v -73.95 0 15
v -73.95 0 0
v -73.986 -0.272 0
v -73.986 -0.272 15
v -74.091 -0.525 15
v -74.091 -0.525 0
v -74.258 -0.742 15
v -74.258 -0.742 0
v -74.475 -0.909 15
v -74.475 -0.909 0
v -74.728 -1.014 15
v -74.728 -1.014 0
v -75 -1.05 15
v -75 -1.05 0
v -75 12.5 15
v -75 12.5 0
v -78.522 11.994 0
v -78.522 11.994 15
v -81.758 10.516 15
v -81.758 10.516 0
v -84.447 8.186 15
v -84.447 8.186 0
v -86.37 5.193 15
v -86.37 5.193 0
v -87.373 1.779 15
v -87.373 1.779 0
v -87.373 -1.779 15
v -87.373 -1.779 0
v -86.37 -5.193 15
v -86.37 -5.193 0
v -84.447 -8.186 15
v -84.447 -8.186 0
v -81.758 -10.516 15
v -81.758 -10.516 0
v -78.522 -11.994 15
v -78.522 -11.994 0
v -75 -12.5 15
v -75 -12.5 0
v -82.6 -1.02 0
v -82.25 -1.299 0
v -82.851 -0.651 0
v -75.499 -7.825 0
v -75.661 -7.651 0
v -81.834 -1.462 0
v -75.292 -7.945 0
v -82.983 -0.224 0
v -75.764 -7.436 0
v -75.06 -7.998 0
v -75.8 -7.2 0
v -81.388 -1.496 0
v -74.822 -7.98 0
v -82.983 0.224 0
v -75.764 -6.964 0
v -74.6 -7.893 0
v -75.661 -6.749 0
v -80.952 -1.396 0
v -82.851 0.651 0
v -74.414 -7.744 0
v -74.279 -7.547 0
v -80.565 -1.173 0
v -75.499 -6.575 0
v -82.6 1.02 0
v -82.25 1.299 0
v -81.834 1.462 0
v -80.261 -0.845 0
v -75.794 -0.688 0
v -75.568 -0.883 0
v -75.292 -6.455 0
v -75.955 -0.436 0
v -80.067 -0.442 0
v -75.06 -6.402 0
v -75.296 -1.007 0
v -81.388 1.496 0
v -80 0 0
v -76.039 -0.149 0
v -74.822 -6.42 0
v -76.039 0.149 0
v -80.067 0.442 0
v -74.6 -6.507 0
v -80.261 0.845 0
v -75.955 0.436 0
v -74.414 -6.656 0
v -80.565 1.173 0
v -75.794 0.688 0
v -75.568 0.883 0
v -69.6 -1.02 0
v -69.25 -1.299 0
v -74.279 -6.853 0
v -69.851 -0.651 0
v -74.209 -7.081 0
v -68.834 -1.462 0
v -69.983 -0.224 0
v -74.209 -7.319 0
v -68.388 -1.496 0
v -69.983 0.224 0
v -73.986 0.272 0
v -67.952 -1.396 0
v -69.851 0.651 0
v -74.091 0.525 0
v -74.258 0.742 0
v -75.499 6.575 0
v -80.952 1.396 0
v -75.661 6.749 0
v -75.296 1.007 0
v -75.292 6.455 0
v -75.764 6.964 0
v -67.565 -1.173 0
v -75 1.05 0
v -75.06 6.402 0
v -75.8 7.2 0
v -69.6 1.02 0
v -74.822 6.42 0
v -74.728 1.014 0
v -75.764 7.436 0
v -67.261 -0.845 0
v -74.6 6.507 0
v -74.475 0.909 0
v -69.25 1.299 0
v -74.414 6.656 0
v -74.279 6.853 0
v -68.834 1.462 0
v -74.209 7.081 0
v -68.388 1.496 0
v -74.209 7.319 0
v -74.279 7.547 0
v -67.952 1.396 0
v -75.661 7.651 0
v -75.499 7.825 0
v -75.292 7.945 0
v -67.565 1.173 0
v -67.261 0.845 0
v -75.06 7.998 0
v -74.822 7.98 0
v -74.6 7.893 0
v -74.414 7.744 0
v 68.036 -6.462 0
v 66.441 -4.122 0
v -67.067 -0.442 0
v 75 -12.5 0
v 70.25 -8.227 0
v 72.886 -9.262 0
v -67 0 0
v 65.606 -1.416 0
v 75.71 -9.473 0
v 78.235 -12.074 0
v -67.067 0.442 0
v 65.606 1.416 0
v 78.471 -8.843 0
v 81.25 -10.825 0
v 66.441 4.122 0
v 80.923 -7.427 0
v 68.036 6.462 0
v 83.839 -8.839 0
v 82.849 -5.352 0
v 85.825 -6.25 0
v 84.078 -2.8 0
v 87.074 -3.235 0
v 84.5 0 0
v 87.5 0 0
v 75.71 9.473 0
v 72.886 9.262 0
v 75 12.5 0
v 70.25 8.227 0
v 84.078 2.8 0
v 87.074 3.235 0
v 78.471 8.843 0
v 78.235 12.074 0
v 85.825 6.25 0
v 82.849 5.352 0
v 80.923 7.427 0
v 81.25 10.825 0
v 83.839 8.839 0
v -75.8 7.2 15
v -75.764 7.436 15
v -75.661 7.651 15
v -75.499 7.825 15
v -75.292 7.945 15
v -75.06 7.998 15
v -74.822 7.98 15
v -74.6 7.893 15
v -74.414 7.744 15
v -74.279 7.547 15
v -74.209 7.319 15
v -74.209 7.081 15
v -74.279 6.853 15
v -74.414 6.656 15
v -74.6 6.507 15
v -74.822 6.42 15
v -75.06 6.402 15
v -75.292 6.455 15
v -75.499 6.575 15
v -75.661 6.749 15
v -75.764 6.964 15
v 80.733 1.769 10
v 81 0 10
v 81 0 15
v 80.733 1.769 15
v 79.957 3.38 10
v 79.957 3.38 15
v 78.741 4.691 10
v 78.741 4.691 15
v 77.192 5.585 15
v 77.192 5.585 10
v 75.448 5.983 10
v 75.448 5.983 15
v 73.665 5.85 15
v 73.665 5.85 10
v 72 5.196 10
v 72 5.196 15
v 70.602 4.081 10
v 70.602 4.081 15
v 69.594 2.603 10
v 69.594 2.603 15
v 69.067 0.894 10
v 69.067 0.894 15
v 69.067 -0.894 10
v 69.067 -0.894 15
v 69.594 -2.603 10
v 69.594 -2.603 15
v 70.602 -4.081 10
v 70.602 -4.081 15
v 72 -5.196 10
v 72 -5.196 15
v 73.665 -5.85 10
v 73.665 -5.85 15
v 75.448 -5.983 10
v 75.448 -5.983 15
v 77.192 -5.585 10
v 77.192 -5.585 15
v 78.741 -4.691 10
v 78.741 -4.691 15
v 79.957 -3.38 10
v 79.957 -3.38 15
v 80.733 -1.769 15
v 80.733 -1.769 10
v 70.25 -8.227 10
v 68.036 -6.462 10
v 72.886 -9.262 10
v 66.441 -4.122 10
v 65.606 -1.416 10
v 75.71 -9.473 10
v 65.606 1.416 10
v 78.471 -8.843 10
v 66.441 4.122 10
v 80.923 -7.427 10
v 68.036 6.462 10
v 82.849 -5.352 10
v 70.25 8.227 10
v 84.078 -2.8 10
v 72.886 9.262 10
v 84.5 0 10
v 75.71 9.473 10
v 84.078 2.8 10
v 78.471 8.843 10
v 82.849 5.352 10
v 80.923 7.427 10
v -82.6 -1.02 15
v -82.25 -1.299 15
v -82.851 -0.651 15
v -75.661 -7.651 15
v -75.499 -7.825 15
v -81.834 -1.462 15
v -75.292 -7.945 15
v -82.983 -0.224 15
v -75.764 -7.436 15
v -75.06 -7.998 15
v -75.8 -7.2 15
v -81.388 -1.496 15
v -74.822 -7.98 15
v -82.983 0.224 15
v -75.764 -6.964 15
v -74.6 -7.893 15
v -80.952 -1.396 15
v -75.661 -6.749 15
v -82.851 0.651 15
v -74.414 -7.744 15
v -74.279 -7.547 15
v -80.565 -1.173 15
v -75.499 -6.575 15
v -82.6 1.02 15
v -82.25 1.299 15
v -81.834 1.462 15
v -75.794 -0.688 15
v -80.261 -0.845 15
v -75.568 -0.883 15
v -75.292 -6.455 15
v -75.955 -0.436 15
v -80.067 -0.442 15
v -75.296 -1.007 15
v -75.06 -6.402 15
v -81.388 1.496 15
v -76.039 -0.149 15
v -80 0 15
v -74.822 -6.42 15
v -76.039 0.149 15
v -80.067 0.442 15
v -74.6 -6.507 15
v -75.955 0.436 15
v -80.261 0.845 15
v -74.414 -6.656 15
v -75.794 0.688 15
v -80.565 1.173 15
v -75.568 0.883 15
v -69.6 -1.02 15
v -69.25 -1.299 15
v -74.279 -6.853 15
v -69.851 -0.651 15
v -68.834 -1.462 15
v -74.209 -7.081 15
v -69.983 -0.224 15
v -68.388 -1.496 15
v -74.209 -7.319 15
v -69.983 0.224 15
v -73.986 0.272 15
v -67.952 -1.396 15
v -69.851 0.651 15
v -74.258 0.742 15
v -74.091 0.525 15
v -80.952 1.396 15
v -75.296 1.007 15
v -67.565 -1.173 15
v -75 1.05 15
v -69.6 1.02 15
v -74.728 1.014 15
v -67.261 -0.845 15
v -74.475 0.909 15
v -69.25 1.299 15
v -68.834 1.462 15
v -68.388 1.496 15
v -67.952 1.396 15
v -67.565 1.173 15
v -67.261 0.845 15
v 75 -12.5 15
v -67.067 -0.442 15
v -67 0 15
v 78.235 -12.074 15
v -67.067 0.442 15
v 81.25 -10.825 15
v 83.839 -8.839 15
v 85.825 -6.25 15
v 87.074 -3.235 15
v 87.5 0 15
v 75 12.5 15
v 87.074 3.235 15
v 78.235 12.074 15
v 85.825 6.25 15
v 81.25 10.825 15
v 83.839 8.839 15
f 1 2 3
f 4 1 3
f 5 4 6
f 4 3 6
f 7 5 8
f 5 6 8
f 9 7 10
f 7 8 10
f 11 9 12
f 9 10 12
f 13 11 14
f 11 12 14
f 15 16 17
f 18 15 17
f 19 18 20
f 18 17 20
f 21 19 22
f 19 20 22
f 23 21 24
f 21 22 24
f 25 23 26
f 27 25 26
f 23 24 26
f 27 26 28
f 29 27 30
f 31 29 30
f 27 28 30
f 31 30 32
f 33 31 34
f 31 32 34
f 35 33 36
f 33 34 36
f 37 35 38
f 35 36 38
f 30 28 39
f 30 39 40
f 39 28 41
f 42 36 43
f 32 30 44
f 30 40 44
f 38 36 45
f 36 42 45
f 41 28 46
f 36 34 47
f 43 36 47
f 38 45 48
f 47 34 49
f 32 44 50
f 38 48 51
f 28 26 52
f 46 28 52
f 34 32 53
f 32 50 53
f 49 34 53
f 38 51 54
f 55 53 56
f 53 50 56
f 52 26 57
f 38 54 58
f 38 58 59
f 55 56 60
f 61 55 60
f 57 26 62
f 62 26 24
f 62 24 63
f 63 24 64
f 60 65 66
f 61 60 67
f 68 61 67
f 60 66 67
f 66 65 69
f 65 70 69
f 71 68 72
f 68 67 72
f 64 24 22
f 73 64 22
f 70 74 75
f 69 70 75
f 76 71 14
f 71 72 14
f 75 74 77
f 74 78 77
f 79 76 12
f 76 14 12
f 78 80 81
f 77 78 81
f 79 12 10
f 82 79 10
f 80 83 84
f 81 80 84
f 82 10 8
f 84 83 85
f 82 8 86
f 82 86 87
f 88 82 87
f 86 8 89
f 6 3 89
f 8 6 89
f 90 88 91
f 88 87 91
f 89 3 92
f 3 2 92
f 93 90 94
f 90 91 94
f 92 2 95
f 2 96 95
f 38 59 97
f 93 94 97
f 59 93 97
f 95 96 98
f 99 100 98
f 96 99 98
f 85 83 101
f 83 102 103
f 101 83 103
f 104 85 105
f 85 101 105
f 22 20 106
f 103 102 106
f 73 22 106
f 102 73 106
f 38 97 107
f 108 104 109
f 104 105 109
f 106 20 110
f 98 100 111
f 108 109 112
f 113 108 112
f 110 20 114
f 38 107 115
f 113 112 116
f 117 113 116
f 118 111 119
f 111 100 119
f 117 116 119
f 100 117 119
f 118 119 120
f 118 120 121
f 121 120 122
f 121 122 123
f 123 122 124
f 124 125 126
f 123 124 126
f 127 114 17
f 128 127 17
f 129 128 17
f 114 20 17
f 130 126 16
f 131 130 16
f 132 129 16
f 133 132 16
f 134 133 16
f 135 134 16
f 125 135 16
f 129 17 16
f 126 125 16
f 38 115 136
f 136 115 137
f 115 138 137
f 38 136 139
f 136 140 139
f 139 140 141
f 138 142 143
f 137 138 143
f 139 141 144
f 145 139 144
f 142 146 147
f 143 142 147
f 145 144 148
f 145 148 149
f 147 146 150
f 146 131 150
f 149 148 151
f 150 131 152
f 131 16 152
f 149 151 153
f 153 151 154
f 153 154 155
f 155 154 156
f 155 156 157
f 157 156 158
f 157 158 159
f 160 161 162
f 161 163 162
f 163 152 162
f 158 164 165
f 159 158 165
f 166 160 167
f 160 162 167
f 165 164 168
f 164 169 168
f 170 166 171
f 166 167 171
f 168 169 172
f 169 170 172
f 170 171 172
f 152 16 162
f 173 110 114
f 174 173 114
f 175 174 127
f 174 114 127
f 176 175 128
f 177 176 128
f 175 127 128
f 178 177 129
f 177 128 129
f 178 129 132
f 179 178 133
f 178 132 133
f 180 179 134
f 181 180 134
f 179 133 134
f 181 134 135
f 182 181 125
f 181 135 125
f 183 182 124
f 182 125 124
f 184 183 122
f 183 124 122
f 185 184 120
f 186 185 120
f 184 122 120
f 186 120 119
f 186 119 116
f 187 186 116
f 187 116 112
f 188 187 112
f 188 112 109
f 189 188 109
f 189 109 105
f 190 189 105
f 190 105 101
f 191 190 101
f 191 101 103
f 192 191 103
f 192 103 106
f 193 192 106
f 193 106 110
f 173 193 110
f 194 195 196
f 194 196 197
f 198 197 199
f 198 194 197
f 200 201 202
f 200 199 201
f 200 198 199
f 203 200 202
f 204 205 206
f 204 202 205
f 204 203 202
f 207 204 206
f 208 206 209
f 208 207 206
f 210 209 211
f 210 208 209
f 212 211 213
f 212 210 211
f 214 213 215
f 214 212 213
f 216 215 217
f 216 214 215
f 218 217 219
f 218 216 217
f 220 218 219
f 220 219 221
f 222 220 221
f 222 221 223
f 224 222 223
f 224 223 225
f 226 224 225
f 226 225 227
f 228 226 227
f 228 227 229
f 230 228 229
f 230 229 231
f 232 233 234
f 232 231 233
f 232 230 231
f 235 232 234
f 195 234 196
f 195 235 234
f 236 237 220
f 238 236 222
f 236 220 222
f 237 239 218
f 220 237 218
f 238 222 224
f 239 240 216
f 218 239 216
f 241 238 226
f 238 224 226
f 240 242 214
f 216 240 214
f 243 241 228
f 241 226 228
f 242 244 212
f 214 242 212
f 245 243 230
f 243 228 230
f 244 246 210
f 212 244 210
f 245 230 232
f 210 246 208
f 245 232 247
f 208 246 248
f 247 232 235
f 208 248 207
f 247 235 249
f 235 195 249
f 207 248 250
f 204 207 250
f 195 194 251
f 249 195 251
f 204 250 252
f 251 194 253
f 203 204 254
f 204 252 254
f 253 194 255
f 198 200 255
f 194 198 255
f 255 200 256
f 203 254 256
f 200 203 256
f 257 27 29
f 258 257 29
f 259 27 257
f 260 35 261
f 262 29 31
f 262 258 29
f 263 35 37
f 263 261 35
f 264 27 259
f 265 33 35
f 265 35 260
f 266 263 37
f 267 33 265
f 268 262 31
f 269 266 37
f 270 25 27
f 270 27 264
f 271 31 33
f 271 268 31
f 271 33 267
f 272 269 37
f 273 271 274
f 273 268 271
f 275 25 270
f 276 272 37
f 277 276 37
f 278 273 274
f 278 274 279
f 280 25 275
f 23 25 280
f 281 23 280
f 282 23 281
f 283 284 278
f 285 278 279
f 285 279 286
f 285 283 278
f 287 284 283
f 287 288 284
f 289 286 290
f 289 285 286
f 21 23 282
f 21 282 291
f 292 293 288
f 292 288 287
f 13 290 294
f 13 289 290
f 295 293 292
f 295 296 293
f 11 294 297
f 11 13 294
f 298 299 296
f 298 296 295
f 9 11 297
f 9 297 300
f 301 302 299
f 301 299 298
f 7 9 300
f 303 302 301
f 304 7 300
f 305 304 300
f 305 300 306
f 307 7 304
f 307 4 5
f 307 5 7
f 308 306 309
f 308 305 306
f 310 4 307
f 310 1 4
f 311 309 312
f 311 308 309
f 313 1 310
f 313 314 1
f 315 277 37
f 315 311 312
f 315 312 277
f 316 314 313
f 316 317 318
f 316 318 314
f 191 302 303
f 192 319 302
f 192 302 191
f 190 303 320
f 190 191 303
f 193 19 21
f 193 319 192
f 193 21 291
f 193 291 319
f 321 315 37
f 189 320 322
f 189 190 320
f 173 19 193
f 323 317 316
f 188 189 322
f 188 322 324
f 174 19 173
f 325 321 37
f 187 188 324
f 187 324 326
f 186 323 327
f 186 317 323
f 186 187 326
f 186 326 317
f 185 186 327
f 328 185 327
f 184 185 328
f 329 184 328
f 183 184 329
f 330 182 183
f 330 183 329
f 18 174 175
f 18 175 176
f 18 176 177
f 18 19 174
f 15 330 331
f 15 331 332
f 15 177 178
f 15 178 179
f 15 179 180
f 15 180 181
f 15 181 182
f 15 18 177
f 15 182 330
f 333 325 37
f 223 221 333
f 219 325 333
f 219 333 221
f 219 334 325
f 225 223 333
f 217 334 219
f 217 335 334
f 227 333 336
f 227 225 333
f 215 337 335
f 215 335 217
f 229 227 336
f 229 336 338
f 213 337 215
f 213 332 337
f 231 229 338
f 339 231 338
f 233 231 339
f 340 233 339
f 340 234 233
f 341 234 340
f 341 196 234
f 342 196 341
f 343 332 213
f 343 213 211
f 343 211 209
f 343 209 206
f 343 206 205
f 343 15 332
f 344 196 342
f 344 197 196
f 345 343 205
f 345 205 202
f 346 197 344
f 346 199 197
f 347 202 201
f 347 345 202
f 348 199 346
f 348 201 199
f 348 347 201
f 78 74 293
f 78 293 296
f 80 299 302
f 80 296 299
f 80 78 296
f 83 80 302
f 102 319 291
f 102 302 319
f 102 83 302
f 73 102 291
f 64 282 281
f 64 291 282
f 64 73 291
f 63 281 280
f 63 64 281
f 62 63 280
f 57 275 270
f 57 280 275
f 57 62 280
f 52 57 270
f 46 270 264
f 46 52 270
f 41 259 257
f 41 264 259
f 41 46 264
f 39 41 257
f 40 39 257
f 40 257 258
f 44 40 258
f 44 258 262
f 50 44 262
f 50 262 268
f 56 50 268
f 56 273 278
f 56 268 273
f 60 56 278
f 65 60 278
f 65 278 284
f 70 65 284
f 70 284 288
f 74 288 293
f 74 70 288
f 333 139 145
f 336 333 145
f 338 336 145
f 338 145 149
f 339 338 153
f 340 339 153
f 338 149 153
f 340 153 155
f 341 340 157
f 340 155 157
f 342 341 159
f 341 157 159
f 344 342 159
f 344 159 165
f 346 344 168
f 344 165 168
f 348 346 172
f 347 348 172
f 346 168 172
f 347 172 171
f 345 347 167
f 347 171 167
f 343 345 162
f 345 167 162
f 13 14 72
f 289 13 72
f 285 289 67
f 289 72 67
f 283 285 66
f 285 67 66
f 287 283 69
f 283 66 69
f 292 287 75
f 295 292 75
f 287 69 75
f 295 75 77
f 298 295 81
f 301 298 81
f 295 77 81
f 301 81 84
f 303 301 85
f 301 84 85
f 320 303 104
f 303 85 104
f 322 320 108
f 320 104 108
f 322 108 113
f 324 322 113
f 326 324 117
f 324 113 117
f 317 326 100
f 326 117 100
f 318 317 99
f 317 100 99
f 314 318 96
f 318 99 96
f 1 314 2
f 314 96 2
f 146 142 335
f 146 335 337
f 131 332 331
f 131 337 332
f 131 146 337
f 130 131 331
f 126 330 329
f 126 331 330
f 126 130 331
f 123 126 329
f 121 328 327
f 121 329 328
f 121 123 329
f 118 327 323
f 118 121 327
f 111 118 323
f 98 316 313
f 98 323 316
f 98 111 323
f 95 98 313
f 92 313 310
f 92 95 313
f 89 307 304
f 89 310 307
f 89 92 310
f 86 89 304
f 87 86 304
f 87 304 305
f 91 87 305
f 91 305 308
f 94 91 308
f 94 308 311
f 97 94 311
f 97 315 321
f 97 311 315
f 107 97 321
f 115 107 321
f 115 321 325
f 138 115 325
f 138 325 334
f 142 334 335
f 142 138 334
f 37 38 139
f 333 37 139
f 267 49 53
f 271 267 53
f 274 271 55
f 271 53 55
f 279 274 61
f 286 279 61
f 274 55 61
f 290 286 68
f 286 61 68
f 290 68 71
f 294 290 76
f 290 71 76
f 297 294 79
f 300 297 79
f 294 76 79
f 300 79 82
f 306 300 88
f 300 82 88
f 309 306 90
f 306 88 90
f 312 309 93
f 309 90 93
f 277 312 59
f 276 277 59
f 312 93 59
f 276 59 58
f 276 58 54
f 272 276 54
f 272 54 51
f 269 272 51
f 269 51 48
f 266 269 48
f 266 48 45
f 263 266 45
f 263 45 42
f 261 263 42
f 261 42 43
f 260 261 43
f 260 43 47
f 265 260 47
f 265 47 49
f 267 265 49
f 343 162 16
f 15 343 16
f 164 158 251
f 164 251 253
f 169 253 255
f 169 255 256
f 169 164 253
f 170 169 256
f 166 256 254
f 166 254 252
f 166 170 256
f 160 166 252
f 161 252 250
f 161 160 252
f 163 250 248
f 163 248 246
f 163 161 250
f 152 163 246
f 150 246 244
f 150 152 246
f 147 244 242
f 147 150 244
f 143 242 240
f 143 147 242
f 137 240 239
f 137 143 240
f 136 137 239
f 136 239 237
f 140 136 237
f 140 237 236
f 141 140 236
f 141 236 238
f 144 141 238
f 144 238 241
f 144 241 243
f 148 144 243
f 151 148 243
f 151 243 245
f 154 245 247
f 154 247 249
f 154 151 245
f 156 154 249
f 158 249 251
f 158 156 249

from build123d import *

# Parameters (mm, degrees)
EXTRUDE_1_DEPTH          = 15
CUT_EXTRUDE_3_DEPTH      = 90.652105385
CUT_EXTRUDE_3_DEPTH_BACK = 90.652105385
SKETCH_7_R               = 1.5
SKETCH_8_R               = 9.5
CUT_EXTRUDE_4_DEPTH      = 10
SKETCH_9_R               = 6
CUT_EXTRUDE_10_DEPTH     = 20
M2X0_4_1_D               = 1.6
M2X0_4_2_D               = 1.6


with BuildPart() as part:
    # ｽｹｯﾁ2 → ﾎﾞｽ - 押し出し1 (new body)
    with BuildSketch(Plane.XY):
        with BuildLine():
            ThreePointArc((-62.5, 0), (-66.161165235, 8.838834765), (-75, 12.5))
            Line((-75, 12.5), (-75, 1.05))
            ThreePointArc((-75, 1.05), (-74.25753788, 0.74246212), (-73.95, 0))
            ThreePointArc((-73.95, 0), (-74.25753788, -0.74246212), (-75, -1.05))
            Line((-75, -1.05), (-75, -12.5))
            ThreePointArc((-75, -12.5), (-66.161165235, -8.838834765), (-62.5, 0))
        make_face()
        with BuildLine():
            Line((-75, 1.05), (-75, 12.5))
            ThreePointArc((-75, 12.5), (-87.5, 0), (-75, -12.5))
            Line((-75, -12.5), (-75, -1.05))
            ThreePointArc((-75, -1.05), (-76.05, 0), (-75, 1.05))
        make_face()
        with BuildLine():
            Line((75, 12.5), (-75, 12.5))
            ThreePointArc((-75, 12.5), (-66.161165235, 8.838834765), (-62.5, 0))
            ThreePointArc((-62.5, 0), (-66.161165235, -8.838834765), (-75, -12.5))
            Line((-75, -12.5), (75, -12.5))
            ThreePointArc((75, -12.5), (62.5, 0), (75, 12.5))
        make_face()
        with BuildLine():
            ThreePointArc((87.5, 0), (83.838834765, 8.838834765), (75, 12.5))
            Line((75, 12.5), (75, 1.05))
            ThreePointArc((75, 1.05), (75.74246212, 0.74246212), (76.05, 0))
            ThreePointArc((76.05, 0), (75.74246212, -0.74246212), (75, -1.05))
            Line((75, -1.05), (75, -12.5))
            ThreePointArc((75, -12.5), (83.838834765, -8.838834765), (87.5, 0))
        make_face()
        with BuildLine():
            Line((75, 1.05), (75, 12.5))
            ThreePointArc((75, 12.5), (62.5, 0), (75, -12.5))
            Line((75, -12.5), (75, -1.05))
            ThreePointArc((75, -1.05), (73.95, 0), (75, 1.05))
        make_face()
    extrude(amount=EXTRUDE_1_DEPTH)

    # ｽｹｯﾁ7 → ｶｯﾄ - 押し出し3 (cut, two sides: drawn at the far end of the back side and taken through both)
    with BuildSketch(Plane.XY.offset(-CUT_EXTRUDE_3_DEPTH_BACK)):
        with Locations((-68.5, 0)):
            Circle(SKETCH_7_R)
        with Locations((-81.5, 0)):
            Circle(SKETCH_7_R)
    extrude(amount=CUT_EXTRUDE_3_DEPTH + CUT_EXTRUDE_3_DEPTH_BACK, mode=Mode.SUBTRACT)

    # ｽｹｯﾁ8 → ｶｯﾄ - 押し出し4 (cut)
    with BuildSketch(Plane.XY):
        with Locations((75, 0)):
            Circle(SKETCH_8_R)
    extrude(amount=CUT_EXTRUDE_4_DEPTH, mode=Mode.SUBTRACT)

    # ｽｹｯﾁ9 → ｶｯﾄ - 押し出し10 (cut)
    with BuildSketch(Plane.XY):
        with Locations((75, 0)):
            Circle(SKETCH_9_R)
    extrude(amount=CUT_EXTRUDE_10_DEPTH, mode=Mode.SUBTRACT)

    # M2x0.4 ねじ穴1 (through all)
    with Locations(Plane.XY.offset(15)):
        with Locations((-75, 7.2), (-67.8, 0), (-75, -7.2)):
            Hole(M2X0_4_1_D / 2)

    # M2x0.4 ねじ穴2 (through all)
    with Locations(Plane.XY.offset(15)):
        with Locations((-67.8, 0)):
            Hole(M2X0_4_2_D / 2)


solid = part.part
